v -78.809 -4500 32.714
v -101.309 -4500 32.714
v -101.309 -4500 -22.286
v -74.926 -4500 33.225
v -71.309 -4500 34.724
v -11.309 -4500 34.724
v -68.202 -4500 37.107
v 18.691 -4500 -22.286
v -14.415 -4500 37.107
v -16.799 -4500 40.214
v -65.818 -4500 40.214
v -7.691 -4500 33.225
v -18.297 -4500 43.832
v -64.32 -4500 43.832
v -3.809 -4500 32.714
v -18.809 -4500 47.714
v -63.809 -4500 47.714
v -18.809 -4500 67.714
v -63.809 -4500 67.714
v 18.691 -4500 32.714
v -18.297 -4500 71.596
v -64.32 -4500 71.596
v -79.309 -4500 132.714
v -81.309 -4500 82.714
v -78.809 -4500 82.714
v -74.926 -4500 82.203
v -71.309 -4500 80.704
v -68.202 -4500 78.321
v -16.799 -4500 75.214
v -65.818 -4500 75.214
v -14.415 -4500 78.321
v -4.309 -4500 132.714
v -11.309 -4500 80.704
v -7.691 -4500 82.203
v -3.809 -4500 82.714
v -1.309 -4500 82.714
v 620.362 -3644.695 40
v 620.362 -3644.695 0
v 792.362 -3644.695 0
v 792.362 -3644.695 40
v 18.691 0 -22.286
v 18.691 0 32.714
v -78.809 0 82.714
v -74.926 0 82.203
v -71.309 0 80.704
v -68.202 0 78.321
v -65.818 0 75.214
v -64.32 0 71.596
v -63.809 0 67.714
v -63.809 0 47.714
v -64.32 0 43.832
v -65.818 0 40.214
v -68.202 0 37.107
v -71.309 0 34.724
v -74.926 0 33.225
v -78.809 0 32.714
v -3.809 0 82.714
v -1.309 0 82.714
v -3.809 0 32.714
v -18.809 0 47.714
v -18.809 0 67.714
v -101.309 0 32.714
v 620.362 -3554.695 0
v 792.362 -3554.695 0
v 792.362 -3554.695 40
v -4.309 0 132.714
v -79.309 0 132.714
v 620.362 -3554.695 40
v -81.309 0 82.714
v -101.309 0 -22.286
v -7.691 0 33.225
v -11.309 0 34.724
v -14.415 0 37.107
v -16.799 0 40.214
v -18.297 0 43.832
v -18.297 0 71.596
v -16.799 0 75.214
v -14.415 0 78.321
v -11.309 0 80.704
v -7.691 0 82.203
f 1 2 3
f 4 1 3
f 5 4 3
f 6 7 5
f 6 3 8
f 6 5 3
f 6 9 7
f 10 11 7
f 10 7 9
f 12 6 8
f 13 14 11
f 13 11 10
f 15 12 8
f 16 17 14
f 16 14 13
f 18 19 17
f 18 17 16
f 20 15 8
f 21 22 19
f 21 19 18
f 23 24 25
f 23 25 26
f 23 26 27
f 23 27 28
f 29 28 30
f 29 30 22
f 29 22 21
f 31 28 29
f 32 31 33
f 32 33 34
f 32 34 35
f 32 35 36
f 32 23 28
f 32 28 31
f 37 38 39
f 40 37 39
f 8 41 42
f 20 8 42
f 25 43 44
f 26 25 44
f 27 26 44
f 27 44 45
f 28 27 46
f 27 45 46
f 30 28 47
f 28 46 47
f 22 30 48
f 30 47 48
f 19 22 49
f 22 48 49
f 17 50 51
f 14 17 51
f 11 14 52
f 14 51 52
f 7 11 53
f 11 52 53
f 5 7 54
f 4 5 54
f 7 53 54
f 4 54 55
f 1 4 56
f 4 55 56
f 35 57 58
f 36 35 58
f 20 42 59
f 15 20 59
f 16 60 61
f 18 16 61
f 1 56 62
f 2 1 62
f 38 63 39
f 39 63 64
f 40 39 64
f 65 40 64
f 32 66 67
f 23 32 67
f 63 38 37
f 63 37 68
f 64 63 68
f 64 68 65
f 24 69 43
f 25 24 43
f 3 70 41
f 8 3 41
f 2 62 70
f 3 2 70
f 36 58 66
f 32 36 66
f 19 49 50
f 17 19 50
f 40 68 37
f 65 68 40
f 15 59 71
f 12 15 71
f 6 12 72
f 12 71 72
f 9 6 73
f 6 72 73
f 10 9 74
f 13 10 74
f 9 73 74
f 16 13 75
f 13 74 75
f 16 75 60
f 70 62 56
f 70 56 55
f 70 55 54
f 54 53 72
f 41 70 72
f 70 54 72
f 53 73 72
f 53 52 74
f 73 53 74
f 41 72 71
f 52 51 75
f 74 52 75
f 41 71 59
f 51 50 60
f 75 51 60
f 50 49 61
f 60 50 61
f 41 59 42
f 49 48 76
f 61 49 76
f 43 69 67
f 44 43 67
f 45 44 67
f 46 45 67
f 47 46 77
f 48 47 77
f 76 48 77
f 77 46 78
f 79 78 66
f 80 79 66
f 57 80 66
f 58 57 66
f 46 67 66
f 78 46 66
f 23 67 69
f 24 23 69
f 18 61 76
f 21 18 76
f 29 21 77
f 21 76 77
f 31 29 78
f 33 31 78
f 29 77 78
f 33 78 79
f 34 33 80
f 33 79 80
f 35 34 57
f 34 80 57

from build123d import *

# Parameters (mm, degrees)
F1_DEPTH = 4500
F2_W     = 172
F2_H     = 90
F3_DEPTH = 40


with BuildPart() as f1:
    # F0 (on Front) → F1 (new body)
    with BuildSketch(Plane.XZ):
        with BuildLine():
            Line((-4.308599, 132.713967), (-79.308599, 132.713967))
            Line((-79.308599, 132.713967), (-81.308599, 82.713967))
            Line((-81.308599, 82.713967), (-78.808599, 82.713967))
            ThreePointArc((-78.808599, 82.713967), (-68.201997, 78.320568), (-63.808599, 67.713967))
            Line((-63.808599, 67.713967), (-63.808599, 47.713967))
            ThreePointArc((-63.808599, 47.713967), (-68.201997, 37.107365), (-78.808599, 32.713967))
            Line((-78.808599, 32.713967), (-101.308599, 32.713967))
            Line((-101.308599, 32.713967), (-101.308599, -22.286033))
            Line((-101.308599, -22.286033), (18.691401, -22.286033))
            Line((18.691401, -22.286033), (18.691401, 32.713967))
            Line((18.691401, 32.713967), (-3.808599, 32.713967))
            ThreePointArc((-3.808599, 32.713967), (-14.415201, 37.107365), (-18.808599, 47.713967))
            Line((-18.808599, 47.713967), (-18.808599, 67.713967))
            ThreePointArc((-18.808599, 67.713967), (-14.415201, 78.320568), (-3.808599, 82.713967))
            Line((-3.808599, 82.713967), (-1.308599, 82.713967))
            Line((-1.308599, 82.713967), (-4.308599, 132.713967))
        make_face()
    extrude(amount=F1_DEPTH)


with BuildPart() as f3:
    # F2 (on Top) → F3 (new body)
    with BuildSketch(Plane.XY):
        with Locations((706.362043, -3599.694805)):
            Rectangle(F2_W, F2_H)
    extrude(amount=F3_DEPTH)


solid = Compound([f1.part, f3.part])
